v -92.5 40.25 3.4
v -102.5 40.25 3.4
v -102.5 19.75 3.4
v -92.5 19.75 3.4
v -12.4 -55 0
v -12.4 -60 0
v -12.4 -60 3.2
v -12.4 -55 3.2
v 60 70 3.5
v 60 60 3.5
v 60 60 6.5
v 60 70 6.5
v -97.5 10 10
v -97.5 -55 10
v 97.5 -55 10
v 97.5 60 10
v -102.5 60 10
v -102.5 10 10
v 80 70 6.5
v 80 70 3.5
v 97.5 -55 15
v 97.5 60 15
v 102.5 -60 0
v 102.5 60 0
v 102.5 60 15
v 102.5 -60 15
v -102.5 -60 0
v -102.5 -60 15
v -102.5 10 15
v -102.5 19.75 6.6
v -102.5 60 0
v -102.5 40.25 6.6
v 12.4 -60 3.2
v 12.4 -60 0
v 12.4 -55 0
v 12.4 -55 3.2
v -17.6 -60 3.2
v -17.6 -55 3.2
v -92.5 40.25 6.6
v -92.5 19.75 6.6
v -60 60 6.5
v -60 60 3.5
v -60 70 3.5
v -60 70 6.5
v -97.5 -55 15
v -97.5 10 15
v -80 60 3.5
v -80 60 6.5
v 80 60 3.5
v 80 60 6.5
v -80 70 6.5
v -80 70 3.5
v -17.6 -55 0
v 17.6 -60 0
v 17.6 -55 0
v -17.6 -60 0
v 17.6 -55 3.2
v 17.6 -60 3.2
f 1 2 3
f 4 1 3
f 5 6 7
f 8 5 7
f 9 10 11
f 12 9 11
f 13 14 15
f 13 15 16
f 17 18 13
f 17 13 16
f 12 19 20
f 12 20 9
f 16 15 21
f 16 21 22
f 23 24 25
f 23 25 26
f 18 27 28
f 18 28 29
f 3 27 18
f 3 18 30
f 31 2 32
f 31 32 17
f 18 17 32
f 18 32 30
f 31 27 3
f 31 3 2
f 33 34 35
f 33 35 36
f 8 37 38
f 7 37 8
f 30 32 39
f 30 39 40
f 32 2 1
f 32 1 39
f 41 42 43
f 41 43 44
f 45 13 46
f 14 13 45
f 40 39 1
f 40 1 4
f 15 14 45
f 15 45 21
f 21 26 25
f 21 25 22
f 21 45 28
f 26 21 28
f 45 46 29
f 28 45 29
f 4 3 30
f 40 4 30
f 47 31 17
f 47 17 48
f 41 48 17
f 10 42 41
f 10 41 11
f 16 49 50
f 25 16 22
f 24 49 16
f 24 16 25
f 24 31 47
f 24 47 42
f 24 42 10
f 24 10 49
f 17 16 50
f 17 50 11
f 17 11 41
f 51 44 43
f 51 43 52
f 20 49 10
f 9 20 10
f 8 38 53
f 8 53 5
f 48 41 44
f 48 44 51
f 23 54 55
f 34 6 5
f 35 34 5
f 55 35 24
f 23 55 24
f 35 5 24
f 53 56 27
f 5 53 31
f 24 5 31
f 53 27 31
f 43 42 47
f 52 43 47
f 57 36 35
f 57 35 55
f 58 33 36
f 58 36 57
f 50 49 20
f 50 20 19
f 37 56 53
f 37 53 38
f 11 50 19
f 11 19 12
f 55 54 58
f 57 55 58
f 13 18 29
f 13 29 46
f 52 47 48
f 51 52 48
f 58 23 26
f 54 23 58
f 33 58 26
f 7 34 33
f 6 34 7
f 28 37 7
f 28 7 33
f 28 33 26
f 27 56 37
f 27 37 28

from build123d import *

# Parameters (mm, degrees)
SKETCH1_W           = 120
SKETCH1_H           = 205
BOSS_EXTRUDE1_DEPTH = 10
BOSS_EXTRUDE2_DEPTH = 5
SKETCH3_W           = 20.5
SKETCH3_H           = 3.2
CUT_EXTRUDE1_DEPTH  = 10
SKETCH4_W           = 20
SKETCH4_H           = 3
BOSS_EXTRUDE3_DEPTH = 10
SKETCH5_W           = 5.2
SKETCH5_H           = 3.2
CUT_EXTRUDE2_DEPTH  = 5


with BuildPart() as part:
    # Sketch1 → Boss-Extrude1 (new body)
    with BuildSketch(Plane(origin=(0, 0, 0), x_dir=(0, 1, 0), z_dir=(0, 0, 1))):
        Rectangle(SKETCH1_W, SKETCH1_H)
    extrude(amount=BOSS_EXTRUDE1_DEPTH)

    # Sketch2 → Boss-Extrude2 (add)
    with BuildSketch(Plane.XY.offset(10)):
        Polygon((-97.5, -55), (97.5, -55), (97.5, 60), (102.5, 60), (102.5, -60), (-102.5, -60), (-102.5, 10), (-97.5, 10), align=None)
    extrude(amount=BOSS_EXTRUDE2_DEPTH)

    # Sketch3 → Cut-Extrude1 (cut)
    with BuildSketch(Plane(origin=(-102.5, 0, 0), x_dir=(0, -1, 0), z_dir=(-1, 0, 0))):
        with Locations((-30, 5)):
            Rectangle(SKETCH3_W, SKETCH3_H)
    extrude(amount=-CUT_EXTRUDE1_DEPTH, mode=Mode.SUBTRACT)

    # Sketch4 → Boss-Extrude3 (add)
    with BuildSketch(Plane(origin=(0, 60, 0), x_dir=(-1, 0, 0), z_dir=(0, 1, 0))):
        with Locations((70, 5)):
            Rectangle(SKETCH4_W, SKETCH4_H)
        with Locations((-70, 5)):
            Rectangle(SKETCH4_W, SKETCH4_H)
    extrude(amount=BOSS_EXTRUDE3_DEPTH)

    # Sketch5 → Cut-Extrude2 (cut)
    with BuildSketch(Plane.XZ.offset(60)):
        with Locations((15, 1.6)):
            Rectangle(SKETCH5_W, SKETCH5_H)
        with Locations((-15, 1.6)):
            Rectangle(SKETCH5_W, SKETCH5_H)
    extrude(amount=-CUT_EXTRUDE2_DEPTH, mode=Mode.SUBTRACT)


solid = part.part
